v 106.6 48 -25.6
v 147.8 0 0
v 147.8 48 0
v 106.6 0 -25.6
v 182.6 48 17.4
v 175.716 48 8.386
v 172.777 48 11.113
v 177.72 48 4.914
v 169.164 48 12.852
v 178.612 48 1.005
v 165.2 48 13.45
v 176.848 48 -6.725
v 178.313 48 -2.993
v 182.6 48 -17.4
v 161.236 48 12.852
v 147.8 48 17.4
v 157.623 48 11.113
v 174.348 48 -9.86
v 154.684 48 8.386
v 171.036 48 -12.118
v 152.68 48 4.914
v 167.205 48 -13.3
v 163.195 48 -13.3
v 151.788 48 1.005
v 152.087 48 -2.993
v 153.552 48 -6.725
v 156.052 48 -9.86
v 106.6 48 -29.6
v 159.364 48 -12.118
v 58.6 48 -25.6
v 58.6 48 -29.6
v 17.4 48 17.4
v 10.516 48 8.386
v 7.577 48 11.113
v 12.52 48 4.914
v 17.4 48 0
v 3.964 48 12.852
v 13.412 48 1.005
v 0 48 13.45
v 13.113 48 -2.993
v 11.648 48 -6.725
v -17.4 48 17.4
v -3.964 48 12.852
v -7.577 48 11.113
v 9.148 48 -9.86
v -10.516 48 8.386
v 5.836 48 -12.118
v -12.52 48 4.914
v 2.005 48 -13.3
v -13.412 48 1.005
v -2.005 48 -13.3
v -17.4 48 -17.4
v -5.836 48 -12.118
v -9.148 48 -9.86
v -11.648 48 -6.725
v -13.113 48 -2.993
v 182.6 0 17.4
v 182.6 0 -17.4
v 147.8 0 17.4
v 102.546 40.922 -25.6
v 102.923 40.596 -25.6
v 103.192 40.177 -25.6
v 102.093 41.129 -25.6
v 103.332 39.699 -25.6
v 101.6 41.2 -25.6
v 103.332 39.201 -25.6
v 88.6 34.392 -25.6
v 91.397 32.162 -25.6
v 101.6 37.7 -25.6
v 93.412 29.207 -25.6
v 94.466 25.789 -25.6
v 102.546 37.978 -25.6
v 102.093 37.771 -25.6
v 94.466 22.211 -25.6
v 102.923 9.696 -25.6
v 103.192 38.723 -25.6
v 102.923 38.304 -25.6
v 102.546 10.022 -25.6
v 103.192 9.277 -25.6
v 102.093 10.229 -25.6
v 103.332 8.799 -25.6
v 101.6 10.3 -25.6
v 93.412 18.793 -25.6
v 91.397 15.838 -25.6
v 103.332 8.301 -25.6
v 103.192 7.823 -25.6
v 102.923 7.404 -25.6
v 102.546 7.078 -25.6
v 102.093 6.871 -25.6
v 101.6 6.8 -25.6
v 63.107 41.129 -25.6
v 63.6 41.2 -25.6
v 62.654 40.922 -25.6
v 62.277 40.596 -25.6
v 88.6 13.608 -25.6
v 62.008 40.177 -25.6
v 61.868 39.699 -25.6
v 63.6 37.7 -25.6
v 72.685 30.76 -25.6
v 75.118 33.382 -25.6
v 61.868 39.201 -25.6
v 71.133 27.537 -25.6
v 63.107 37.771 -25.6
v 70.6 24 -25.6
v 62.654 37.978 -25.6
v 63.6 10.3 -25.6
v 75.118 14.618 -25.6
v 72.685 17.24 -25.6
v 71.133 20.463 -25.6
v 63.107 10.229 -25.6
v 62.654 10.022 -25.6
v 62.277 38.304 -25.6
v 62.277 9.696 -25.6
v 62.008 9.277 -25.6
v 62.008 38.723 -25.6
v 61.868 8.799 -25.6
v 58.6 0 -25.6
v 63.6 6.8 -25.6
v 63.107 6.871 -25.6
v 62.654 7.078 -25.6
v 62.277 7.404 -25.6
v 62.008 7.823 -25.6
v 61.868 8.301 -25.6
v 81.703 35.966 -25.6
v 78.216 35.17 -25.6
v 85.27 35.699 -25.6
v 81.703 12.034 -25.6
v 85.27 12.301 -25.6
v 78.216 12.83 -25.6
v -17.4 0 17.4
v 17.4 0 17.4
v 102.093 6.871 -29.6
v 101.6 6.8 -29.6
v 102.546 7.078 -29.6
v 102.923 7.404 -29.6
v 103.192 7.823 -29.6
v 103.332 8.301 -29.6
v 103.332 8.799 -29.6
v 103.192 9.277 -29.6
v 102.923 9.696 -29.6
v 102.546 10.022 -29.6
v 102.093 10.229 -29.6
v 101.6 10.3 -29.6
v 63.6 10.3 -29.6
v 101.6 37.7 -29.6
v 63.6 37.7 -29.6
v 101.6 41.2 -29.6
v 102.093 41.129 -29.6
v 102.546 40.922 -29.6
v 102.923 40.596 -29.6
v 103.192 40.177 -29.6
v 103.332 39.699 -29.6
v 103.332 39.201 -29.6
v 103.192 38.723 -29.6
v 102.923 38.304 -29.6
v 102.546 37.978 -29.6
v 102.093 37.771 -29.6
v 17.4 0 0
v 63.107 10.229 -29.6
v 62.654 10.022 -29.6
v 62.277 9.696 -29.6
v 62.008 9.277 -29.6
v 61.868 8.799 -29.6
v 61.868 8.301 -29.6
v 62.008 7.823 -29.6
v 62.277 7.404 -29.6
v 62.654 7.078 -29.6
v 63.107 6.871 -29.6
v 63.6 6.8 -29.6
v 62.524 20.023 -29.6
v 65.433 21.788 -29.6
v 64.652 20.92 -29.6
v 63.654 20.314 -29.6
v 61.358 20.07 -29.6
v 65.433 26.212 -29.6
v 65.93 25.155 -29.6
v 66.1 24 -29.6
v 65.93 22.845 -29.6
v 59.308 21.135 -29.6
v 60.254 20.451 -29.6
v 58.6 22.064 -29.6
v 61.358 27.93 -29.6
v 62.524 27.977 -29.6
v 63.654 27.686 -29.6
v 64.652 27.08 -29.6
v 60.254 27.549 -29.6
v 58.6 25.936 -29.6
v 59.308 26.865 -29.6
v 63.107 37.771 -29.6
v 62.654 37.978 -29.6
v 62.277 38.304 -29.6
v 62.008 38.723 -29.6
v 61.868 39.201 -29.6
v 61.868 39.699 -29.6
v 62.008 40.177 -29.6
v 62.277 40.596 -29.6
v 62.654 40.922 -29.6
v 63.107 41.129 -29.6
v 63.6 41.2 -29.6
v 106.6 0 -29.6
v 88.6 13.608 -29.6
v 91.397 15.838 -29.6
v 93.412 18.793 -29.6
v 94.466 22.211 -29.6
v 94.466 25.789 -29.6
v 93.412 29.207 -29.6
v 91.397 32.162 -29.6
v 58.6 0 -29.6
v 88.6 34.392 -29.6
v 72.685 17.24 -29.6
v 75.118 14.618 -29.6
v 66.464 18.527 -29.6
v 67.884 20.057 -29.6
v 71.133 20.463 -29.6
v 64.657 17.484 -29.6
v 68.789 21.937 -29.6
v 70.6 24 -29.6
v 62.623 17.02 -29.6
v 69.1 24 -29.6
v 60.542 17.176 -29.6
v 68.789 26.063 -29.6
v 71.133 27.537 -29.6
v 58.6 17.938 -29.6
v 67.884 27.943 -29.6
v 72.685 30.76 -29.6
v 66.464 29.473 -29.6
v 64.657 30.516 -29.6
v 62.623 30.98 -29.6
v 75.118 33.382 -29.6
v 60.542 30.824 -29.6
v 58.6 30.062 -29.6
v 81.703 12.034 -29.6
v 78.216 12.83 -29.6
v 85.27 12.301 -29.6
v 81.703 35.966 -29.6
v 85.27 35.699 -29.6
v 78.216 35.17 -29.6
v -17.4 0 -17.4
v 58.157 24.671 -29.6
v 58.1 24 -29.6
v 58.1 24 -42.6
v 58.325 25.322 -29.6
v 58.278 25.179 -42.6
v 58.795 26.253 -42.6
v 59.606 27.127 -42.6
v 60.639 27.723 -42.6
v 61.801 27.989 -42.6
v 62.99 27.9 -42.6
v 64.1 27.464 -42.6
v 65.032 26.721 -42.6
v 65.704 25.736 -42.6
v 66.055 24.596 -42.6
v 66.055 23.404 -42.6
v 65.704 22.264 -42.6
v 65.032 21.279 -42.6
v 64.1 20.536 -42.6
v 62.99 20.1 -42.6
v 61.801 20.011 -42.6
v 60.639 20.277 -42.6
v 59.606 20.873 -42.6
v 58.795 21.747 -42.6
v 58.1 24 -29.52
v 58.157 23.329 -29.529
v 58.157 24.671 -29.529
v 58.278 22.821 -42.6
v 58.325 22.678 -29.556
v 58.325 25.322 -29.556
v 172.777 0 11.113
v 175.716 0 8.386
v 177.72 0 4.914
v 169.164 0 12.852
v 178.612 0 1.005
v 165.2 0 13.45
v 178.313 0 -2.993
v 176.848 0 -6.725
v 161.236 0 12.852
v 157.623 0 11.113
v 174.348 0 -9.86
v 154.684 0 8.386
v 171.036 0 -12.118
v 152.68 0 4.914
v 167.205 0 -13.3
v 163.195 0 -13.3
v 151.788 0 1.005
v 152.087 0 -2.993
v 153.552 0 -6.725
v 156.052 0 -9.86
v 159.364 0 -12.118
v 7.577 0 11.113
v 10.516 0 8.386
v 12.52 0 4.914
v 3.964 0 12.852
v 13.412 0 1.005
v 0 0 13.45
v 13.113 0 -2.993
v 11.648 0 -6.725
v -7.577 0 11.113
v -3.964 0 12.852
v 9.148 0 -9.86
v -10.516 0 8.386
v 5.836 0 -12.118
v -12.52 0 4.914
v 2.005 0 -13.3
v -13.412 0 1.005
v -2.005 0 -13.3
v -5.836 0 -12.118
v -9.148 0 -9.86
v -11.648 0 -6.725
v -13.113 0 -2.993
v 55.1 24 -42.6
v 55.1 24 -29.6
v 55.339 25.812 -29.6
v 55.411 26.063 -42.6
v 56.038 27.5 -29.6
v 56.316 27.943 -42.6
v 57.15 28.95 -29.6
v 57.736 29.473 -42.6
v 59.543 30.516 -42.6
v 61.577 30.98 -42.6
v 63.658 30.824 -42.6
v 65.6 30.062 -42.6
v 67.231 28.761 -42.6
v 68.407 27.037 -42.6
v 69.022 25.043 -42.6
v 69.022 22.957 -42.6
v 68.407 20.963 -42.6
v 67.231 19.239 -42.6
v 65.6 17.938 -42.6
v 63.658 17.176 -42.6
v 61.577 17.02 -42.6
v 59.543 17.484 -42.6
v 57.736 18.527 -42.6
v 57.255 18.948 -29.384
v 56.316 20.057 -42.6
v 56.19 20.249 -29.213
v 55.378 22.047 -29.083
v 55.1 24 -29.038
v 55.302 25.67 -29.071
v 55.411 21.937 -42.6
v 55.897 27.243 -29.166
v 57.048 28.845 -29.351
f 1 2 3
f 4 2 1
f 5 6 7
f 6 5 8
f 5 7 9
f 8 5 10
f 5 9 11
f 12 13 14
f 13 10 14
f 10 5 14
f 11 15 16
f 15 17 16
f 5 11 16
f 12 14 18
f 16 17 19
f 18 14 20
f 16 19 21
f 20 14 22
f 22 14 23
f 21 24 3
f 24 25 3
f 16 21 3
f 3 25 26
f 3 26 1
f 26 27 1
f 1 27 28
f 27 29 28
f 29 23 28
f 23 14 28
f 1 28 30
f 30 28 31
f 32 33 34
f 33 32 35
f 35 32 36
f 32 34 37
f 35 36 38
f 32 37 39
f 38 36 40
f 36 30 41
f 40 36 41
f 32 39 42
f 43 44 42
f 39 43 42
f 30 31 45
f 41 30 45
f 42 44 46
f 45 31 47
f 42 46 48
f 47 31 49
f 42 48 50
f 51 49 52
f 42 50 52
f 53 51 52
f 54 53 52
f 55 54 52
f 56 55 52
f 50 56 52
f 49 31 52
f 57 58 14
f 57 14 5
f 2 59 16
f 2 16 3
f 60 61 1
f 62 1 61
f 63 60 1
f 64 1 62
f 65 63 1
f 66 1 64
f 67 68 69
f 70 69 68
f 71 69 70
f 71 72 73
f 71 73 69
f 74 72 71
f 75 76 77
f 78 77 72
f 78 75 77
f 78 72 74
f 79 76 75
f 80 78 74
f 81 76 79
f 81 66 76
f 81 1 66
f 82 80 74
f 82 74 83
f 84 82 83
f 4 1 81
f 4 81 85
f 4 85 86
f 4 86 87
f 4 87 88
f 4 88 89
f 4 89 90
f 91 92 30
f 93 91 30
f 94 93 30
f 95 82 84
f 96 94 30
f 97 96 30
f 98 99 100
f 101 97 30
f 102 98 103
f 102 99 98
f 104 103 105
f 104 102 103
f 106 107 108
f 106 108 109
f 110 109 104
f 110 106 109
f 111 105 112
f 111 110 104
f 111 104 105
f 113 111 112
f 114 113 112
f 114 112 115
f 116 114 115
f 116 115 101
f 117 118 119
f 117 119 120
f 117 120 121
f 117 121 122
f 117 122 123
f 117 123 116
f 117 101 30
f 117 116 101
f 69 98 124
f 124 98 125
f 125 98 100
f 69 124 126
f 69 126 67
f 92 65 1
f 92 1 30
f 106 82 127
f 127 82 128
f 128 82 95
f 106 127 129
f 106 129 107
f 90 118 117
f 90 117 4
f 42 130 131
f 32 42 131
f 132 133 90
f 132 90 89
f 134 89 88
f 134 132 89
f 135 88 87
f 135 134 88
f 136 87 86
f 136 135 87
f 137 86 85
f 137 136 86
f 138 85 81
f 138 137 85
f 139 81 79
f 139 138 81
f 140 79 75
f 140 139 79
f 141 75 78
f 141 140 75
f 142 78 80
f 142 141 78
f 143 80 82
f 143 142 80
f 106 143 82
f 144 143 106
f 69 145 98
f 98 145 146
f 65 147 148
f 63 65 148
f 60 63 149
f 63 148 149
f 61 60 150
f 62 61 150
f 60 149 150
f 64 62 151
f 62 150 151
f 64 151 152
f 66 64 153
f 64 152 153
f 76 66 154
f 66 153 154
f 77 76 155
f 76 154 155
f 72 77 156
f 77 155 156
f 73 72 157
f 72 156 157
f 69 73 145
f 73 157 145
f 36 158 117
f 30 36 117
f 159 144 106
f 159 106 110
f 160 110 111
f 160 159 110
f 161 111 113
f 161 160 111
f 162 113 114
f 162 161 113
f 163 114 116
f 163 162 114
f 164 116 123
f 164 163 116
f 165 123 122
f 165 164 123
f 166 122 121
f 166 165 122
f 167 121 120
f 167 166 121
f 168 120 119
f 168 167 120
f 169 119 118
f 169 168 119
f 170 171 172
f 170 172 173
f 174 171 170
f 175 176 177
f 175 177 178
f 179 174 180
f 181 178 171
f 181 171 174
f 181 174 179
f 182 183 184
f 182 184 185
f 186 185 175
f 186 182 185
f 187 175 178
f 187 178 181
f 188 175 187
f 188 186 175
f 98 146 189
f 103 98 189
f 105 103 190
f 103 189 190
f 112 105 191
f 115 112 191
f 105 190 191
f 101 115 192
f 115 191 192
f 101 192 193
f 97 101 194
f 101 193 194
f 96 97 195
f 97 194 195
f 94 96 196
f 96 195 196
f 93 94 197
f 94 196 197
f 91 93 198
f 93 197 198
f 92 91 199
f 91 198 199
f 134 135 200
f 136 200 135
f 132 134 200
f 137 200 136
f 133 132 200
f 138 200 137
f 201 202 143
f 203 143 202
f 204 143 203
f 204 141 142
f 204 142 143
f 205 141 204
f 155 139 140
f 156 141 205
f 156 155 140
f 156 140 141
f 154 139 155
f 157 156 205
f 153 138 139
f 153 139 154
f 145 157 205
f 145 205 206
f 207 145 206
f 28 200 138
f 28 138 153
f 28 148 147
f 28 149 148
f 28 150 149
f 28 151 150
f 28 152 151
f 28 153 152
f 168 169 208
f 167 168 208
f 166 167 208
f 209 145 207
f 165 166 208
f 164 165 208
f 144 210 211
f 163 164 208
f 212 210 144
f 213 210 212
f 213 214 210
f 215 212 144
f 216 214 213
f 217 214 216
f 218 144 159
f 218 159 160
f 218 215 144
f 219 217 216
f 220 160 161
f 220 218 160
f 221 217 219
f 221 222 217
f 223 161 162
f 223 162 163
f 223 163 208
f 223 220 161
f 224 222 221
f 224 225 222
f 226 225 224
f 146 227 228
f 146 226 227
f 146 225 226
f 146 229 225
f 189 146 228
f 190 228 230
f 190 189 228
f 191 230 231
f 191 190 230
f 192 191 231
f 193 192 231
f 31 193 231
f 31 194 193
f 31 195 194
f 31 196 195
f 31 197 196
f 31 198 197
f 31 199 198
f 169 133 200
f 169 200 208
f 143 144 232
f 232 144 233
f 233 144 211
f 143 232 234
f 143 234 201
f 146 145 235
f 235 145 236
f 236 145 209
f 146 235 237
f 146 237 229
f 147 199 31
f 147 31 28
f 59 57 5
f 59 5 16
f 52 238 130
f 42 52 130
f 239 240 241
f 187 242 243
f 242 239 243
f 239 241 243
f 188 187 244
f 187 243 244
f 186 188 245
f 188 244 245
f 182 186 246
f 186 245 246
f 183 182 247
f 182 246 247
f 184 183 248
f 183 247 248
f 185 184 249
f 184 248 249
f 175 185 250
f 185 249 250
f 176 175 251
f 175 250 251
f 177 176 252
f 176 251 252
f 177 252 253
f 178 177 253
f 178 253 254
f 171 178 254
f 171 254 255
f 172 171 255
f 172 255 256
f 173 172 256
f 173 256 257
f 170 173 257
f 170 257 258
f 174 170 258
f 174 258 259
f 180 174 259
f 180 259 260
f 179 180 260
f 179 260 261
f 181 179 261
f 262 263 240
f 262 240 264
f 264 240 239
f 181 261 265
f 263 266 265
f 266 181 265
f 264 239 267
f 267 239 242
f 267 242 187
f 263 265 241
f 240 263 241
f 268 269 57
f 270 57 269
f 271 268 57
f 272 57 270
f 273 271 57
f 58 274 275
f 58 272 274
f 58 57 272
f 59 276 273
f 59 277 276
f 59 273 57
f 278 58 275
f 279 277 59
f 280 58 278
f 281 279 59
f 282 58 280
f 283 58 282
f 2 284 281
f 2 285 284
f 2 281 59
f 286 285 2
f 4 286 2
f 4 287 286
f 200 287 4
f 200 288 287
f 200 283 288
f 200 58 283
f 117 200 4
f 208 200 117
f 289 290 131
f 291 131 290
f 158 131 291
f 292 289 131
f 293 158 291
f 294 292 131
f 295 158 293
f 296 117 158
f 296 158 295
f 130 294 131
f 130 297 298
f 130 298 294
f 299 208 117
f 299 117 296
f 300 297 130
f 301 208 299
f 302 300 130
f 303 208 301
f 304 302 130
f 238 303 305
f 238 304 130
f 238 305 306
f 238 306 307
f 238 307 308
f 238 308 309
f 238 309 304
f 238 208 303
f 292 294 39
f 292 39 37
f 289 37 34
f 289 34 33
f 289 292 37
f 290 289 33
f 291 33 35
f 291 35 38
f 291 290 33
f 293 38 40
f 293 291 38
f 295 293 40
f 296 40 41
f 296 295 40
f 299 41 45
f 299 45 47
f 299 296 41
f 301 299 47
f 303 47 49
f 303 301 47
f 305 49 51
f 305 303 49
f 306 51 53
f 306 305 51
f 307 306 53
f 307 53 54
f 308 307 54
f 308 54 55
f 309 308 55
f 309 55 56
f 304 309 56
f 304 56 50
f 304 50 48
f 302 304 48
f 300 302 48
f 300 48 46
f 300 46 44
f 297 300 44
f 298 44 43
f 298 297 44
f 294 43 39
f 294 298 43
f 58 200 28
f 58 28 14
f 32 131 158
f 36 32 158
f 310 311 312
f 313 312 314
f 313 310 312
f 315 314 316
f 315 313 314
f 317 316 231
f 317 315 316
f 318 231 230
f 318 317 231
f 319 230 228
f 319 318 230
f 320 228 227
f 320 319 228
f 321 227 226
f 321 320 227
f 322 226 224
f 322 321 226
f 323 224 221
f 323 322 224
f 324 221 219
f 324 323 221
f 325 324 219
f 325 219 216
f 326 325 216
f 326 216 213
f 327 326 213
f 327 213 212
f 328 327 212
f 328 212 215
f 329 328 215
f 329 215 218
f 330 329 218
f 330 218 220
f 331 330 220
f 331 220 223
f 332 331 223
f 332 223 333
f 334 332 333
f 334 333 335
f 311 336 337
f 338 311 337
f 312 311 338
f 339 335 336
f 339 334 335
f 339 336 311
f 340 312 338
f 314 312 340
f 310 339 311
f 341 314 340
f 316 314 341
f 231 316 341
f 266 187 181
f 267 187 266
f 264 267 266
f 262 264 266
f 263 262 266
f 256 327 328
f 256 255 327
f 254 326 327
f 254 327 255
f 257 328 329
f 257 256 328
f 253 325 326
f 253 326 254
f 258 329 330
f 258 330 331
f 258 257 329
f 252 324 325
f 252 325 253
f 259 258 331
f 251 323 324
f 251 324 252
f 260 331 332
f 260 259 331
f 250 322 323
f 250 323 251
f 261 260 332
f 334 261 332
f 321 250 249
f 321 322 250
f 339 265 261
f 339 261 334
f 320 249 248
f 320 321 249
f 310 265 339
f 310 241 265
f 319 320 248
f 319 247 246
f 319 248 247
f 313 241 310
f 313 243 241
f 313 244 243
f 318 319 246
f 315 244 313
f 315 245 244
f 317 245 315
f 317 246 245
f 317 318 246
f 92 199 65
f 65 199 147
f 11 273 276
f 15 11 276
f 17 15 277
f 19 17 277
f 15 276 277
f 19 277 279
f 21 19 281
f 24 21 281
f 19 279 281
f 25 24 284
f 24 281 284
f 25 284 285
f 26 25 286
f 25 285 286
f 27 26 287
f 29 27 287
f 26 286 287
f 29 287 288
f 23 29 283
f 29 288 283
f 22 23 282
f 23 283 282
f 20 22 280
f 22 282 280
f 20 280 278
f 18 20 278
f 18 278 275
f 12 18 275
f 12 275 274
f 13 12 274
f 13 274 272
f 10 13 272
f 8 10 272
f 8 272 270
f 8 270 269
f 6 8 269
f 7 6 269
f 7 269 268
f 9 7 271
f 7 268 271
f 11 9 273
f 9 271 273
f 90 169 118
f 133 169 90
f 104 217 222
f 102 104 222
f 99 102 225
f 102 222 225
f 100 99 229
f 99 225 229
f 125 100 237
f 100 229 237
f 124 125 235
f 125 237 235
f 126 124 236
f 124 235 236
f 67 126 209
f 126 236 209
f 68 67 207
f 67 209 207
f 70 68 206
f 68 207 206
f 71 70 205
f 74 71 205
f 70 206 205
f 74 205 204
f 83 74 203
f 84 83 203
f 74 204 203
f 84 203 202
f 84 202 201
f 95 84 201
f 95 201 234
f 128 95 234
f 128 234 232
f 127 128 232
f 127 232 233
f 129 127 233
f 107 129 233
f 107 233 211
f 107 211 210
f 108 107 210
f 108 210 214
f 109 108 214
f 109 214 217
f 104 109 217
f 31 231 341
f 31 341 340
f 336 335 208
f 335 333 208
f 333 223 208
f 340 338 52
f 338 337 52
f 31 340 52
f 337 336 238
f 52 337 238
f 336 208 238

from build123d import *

# Parameters (mm, degrees)
SKETCH2_R           = 13.45
BOSS_EXTRUDE1_DEPTH = 48
SKETCH4_R           = 12
CUT_EXTRUDE1_DEPTH  = 48
SKETCH5_R           = 7
SKETCH5_R_2         = 4
BOSS_EXTRUDE2_DEPTH = 2
BOSS_EXTRUDE3_START = 13
SKETCH6_R           = 7
SKETCH6_R_2         = 4
BOSS_EXTRUDE3_DEPTH = 13


with BuildPart() as part:
    # Sketch2 → Boss-Extrude1 (new body)
    with BuildSketch(Plane(origin=(0, 0, 0), x_dir=(1, 0, 0), z_dir=(0, 1, 0))):
        Polygon((-17.4, -17.4), (17.4, -17.4), (17.4, 0), (58.6, 25.6), (82.6, 25.6), (82.6, 29.6), (58.6, 29.6), (-17.4, 17.4), align=None)
        with Locations(Location((0, 0, 0), (0, 0, 270))):
            Circle(SKETCH2_R, mode=Mode.SUBTRACT)
    boss_extrude1 = extrude(amount=BOSS_EXTRUDE1_DEPTH)

    # Mirror1: Boss-Extrude1 across plane
    add(boss_extrude1.mirror(Plane(origin=(82.6, 0, 0), x_dir=(0, 0, 1), z_dir=(1, 0, 0))))

    # Sketch4 → Cut-Extrude1 (cut)
    with BuildSketch(Plane(origin=(0, 0, -29.6), x_dir=(-1, 0, 0), z_dir=(0, 0, -1))):
        with Locations((-82.6, 24)):
            Circle(SKETCH4_R)
        with BuildLine():
            Line((-101.6, 10.3), (-63.6, 10.3))
            ThreePointArc((-63.6, 10.3), (-61.85, 8.55), (-63.6, 6.8))
            Line((-63.6, 6.8), (-101.6, 6.8))
            ThreePointArc((-101.6, 6.8), (-103.35, 8.55), (-101.6, 10.3))
        make_face()
        with BuildLine():
            Line((-101.6, 37.7), (-63.6, 37.7))
            ThreePointArc((-63.6, 37.7), (-61.85, 39.45), (-63.6, 41.2))
            Line((-63.6, 41.2), (-101.6, 41.2))
            ThreePointArc((-101.6, 41.2), (-103.35, 39.45), (-101.6, 37.7))
        make_face()
    extrude(amount=-CUT_EXTRUDE1_DEPTH, mode=Mode.SUBTRACT)

    # Sketch5 → Boss-Extrude2 (add)
    with BuildSketch(Plane(origin=(0, 0, -29.6), x_dir=(-1, 0, 0), z_dir=(0, 0, -1))):
        with Locations((-62.1, 24)):
            Circle(SKETCH5_R)
        with Locations((-62.1, 24)):
            Circle(SKETCH5_R_2, mode=Mode.SUBTRACT)
    extrude(amount=-BOSS_EXTRUDE2_DEPTH)

    # Sketch6 → Boss-Extrude3 (add)
    with BuildSketch(Plane(origin=(0, 0, -29.6), x_dir=(-1, 0, 0), z_dir=(0, 0, -1)).offset(BOSS_EXTRUDE3_START)):
        with Locations((-62.1, 24)):
            Circle(SKETCH6_R)
        with Locations((-62.1, 24)):
            Circle(SKETCH6_R_2, mode=Mode.SUBTRACT)
    extrude(amount=-BOSS_EXTRUDE3_DEPTH)


solid = part.part
